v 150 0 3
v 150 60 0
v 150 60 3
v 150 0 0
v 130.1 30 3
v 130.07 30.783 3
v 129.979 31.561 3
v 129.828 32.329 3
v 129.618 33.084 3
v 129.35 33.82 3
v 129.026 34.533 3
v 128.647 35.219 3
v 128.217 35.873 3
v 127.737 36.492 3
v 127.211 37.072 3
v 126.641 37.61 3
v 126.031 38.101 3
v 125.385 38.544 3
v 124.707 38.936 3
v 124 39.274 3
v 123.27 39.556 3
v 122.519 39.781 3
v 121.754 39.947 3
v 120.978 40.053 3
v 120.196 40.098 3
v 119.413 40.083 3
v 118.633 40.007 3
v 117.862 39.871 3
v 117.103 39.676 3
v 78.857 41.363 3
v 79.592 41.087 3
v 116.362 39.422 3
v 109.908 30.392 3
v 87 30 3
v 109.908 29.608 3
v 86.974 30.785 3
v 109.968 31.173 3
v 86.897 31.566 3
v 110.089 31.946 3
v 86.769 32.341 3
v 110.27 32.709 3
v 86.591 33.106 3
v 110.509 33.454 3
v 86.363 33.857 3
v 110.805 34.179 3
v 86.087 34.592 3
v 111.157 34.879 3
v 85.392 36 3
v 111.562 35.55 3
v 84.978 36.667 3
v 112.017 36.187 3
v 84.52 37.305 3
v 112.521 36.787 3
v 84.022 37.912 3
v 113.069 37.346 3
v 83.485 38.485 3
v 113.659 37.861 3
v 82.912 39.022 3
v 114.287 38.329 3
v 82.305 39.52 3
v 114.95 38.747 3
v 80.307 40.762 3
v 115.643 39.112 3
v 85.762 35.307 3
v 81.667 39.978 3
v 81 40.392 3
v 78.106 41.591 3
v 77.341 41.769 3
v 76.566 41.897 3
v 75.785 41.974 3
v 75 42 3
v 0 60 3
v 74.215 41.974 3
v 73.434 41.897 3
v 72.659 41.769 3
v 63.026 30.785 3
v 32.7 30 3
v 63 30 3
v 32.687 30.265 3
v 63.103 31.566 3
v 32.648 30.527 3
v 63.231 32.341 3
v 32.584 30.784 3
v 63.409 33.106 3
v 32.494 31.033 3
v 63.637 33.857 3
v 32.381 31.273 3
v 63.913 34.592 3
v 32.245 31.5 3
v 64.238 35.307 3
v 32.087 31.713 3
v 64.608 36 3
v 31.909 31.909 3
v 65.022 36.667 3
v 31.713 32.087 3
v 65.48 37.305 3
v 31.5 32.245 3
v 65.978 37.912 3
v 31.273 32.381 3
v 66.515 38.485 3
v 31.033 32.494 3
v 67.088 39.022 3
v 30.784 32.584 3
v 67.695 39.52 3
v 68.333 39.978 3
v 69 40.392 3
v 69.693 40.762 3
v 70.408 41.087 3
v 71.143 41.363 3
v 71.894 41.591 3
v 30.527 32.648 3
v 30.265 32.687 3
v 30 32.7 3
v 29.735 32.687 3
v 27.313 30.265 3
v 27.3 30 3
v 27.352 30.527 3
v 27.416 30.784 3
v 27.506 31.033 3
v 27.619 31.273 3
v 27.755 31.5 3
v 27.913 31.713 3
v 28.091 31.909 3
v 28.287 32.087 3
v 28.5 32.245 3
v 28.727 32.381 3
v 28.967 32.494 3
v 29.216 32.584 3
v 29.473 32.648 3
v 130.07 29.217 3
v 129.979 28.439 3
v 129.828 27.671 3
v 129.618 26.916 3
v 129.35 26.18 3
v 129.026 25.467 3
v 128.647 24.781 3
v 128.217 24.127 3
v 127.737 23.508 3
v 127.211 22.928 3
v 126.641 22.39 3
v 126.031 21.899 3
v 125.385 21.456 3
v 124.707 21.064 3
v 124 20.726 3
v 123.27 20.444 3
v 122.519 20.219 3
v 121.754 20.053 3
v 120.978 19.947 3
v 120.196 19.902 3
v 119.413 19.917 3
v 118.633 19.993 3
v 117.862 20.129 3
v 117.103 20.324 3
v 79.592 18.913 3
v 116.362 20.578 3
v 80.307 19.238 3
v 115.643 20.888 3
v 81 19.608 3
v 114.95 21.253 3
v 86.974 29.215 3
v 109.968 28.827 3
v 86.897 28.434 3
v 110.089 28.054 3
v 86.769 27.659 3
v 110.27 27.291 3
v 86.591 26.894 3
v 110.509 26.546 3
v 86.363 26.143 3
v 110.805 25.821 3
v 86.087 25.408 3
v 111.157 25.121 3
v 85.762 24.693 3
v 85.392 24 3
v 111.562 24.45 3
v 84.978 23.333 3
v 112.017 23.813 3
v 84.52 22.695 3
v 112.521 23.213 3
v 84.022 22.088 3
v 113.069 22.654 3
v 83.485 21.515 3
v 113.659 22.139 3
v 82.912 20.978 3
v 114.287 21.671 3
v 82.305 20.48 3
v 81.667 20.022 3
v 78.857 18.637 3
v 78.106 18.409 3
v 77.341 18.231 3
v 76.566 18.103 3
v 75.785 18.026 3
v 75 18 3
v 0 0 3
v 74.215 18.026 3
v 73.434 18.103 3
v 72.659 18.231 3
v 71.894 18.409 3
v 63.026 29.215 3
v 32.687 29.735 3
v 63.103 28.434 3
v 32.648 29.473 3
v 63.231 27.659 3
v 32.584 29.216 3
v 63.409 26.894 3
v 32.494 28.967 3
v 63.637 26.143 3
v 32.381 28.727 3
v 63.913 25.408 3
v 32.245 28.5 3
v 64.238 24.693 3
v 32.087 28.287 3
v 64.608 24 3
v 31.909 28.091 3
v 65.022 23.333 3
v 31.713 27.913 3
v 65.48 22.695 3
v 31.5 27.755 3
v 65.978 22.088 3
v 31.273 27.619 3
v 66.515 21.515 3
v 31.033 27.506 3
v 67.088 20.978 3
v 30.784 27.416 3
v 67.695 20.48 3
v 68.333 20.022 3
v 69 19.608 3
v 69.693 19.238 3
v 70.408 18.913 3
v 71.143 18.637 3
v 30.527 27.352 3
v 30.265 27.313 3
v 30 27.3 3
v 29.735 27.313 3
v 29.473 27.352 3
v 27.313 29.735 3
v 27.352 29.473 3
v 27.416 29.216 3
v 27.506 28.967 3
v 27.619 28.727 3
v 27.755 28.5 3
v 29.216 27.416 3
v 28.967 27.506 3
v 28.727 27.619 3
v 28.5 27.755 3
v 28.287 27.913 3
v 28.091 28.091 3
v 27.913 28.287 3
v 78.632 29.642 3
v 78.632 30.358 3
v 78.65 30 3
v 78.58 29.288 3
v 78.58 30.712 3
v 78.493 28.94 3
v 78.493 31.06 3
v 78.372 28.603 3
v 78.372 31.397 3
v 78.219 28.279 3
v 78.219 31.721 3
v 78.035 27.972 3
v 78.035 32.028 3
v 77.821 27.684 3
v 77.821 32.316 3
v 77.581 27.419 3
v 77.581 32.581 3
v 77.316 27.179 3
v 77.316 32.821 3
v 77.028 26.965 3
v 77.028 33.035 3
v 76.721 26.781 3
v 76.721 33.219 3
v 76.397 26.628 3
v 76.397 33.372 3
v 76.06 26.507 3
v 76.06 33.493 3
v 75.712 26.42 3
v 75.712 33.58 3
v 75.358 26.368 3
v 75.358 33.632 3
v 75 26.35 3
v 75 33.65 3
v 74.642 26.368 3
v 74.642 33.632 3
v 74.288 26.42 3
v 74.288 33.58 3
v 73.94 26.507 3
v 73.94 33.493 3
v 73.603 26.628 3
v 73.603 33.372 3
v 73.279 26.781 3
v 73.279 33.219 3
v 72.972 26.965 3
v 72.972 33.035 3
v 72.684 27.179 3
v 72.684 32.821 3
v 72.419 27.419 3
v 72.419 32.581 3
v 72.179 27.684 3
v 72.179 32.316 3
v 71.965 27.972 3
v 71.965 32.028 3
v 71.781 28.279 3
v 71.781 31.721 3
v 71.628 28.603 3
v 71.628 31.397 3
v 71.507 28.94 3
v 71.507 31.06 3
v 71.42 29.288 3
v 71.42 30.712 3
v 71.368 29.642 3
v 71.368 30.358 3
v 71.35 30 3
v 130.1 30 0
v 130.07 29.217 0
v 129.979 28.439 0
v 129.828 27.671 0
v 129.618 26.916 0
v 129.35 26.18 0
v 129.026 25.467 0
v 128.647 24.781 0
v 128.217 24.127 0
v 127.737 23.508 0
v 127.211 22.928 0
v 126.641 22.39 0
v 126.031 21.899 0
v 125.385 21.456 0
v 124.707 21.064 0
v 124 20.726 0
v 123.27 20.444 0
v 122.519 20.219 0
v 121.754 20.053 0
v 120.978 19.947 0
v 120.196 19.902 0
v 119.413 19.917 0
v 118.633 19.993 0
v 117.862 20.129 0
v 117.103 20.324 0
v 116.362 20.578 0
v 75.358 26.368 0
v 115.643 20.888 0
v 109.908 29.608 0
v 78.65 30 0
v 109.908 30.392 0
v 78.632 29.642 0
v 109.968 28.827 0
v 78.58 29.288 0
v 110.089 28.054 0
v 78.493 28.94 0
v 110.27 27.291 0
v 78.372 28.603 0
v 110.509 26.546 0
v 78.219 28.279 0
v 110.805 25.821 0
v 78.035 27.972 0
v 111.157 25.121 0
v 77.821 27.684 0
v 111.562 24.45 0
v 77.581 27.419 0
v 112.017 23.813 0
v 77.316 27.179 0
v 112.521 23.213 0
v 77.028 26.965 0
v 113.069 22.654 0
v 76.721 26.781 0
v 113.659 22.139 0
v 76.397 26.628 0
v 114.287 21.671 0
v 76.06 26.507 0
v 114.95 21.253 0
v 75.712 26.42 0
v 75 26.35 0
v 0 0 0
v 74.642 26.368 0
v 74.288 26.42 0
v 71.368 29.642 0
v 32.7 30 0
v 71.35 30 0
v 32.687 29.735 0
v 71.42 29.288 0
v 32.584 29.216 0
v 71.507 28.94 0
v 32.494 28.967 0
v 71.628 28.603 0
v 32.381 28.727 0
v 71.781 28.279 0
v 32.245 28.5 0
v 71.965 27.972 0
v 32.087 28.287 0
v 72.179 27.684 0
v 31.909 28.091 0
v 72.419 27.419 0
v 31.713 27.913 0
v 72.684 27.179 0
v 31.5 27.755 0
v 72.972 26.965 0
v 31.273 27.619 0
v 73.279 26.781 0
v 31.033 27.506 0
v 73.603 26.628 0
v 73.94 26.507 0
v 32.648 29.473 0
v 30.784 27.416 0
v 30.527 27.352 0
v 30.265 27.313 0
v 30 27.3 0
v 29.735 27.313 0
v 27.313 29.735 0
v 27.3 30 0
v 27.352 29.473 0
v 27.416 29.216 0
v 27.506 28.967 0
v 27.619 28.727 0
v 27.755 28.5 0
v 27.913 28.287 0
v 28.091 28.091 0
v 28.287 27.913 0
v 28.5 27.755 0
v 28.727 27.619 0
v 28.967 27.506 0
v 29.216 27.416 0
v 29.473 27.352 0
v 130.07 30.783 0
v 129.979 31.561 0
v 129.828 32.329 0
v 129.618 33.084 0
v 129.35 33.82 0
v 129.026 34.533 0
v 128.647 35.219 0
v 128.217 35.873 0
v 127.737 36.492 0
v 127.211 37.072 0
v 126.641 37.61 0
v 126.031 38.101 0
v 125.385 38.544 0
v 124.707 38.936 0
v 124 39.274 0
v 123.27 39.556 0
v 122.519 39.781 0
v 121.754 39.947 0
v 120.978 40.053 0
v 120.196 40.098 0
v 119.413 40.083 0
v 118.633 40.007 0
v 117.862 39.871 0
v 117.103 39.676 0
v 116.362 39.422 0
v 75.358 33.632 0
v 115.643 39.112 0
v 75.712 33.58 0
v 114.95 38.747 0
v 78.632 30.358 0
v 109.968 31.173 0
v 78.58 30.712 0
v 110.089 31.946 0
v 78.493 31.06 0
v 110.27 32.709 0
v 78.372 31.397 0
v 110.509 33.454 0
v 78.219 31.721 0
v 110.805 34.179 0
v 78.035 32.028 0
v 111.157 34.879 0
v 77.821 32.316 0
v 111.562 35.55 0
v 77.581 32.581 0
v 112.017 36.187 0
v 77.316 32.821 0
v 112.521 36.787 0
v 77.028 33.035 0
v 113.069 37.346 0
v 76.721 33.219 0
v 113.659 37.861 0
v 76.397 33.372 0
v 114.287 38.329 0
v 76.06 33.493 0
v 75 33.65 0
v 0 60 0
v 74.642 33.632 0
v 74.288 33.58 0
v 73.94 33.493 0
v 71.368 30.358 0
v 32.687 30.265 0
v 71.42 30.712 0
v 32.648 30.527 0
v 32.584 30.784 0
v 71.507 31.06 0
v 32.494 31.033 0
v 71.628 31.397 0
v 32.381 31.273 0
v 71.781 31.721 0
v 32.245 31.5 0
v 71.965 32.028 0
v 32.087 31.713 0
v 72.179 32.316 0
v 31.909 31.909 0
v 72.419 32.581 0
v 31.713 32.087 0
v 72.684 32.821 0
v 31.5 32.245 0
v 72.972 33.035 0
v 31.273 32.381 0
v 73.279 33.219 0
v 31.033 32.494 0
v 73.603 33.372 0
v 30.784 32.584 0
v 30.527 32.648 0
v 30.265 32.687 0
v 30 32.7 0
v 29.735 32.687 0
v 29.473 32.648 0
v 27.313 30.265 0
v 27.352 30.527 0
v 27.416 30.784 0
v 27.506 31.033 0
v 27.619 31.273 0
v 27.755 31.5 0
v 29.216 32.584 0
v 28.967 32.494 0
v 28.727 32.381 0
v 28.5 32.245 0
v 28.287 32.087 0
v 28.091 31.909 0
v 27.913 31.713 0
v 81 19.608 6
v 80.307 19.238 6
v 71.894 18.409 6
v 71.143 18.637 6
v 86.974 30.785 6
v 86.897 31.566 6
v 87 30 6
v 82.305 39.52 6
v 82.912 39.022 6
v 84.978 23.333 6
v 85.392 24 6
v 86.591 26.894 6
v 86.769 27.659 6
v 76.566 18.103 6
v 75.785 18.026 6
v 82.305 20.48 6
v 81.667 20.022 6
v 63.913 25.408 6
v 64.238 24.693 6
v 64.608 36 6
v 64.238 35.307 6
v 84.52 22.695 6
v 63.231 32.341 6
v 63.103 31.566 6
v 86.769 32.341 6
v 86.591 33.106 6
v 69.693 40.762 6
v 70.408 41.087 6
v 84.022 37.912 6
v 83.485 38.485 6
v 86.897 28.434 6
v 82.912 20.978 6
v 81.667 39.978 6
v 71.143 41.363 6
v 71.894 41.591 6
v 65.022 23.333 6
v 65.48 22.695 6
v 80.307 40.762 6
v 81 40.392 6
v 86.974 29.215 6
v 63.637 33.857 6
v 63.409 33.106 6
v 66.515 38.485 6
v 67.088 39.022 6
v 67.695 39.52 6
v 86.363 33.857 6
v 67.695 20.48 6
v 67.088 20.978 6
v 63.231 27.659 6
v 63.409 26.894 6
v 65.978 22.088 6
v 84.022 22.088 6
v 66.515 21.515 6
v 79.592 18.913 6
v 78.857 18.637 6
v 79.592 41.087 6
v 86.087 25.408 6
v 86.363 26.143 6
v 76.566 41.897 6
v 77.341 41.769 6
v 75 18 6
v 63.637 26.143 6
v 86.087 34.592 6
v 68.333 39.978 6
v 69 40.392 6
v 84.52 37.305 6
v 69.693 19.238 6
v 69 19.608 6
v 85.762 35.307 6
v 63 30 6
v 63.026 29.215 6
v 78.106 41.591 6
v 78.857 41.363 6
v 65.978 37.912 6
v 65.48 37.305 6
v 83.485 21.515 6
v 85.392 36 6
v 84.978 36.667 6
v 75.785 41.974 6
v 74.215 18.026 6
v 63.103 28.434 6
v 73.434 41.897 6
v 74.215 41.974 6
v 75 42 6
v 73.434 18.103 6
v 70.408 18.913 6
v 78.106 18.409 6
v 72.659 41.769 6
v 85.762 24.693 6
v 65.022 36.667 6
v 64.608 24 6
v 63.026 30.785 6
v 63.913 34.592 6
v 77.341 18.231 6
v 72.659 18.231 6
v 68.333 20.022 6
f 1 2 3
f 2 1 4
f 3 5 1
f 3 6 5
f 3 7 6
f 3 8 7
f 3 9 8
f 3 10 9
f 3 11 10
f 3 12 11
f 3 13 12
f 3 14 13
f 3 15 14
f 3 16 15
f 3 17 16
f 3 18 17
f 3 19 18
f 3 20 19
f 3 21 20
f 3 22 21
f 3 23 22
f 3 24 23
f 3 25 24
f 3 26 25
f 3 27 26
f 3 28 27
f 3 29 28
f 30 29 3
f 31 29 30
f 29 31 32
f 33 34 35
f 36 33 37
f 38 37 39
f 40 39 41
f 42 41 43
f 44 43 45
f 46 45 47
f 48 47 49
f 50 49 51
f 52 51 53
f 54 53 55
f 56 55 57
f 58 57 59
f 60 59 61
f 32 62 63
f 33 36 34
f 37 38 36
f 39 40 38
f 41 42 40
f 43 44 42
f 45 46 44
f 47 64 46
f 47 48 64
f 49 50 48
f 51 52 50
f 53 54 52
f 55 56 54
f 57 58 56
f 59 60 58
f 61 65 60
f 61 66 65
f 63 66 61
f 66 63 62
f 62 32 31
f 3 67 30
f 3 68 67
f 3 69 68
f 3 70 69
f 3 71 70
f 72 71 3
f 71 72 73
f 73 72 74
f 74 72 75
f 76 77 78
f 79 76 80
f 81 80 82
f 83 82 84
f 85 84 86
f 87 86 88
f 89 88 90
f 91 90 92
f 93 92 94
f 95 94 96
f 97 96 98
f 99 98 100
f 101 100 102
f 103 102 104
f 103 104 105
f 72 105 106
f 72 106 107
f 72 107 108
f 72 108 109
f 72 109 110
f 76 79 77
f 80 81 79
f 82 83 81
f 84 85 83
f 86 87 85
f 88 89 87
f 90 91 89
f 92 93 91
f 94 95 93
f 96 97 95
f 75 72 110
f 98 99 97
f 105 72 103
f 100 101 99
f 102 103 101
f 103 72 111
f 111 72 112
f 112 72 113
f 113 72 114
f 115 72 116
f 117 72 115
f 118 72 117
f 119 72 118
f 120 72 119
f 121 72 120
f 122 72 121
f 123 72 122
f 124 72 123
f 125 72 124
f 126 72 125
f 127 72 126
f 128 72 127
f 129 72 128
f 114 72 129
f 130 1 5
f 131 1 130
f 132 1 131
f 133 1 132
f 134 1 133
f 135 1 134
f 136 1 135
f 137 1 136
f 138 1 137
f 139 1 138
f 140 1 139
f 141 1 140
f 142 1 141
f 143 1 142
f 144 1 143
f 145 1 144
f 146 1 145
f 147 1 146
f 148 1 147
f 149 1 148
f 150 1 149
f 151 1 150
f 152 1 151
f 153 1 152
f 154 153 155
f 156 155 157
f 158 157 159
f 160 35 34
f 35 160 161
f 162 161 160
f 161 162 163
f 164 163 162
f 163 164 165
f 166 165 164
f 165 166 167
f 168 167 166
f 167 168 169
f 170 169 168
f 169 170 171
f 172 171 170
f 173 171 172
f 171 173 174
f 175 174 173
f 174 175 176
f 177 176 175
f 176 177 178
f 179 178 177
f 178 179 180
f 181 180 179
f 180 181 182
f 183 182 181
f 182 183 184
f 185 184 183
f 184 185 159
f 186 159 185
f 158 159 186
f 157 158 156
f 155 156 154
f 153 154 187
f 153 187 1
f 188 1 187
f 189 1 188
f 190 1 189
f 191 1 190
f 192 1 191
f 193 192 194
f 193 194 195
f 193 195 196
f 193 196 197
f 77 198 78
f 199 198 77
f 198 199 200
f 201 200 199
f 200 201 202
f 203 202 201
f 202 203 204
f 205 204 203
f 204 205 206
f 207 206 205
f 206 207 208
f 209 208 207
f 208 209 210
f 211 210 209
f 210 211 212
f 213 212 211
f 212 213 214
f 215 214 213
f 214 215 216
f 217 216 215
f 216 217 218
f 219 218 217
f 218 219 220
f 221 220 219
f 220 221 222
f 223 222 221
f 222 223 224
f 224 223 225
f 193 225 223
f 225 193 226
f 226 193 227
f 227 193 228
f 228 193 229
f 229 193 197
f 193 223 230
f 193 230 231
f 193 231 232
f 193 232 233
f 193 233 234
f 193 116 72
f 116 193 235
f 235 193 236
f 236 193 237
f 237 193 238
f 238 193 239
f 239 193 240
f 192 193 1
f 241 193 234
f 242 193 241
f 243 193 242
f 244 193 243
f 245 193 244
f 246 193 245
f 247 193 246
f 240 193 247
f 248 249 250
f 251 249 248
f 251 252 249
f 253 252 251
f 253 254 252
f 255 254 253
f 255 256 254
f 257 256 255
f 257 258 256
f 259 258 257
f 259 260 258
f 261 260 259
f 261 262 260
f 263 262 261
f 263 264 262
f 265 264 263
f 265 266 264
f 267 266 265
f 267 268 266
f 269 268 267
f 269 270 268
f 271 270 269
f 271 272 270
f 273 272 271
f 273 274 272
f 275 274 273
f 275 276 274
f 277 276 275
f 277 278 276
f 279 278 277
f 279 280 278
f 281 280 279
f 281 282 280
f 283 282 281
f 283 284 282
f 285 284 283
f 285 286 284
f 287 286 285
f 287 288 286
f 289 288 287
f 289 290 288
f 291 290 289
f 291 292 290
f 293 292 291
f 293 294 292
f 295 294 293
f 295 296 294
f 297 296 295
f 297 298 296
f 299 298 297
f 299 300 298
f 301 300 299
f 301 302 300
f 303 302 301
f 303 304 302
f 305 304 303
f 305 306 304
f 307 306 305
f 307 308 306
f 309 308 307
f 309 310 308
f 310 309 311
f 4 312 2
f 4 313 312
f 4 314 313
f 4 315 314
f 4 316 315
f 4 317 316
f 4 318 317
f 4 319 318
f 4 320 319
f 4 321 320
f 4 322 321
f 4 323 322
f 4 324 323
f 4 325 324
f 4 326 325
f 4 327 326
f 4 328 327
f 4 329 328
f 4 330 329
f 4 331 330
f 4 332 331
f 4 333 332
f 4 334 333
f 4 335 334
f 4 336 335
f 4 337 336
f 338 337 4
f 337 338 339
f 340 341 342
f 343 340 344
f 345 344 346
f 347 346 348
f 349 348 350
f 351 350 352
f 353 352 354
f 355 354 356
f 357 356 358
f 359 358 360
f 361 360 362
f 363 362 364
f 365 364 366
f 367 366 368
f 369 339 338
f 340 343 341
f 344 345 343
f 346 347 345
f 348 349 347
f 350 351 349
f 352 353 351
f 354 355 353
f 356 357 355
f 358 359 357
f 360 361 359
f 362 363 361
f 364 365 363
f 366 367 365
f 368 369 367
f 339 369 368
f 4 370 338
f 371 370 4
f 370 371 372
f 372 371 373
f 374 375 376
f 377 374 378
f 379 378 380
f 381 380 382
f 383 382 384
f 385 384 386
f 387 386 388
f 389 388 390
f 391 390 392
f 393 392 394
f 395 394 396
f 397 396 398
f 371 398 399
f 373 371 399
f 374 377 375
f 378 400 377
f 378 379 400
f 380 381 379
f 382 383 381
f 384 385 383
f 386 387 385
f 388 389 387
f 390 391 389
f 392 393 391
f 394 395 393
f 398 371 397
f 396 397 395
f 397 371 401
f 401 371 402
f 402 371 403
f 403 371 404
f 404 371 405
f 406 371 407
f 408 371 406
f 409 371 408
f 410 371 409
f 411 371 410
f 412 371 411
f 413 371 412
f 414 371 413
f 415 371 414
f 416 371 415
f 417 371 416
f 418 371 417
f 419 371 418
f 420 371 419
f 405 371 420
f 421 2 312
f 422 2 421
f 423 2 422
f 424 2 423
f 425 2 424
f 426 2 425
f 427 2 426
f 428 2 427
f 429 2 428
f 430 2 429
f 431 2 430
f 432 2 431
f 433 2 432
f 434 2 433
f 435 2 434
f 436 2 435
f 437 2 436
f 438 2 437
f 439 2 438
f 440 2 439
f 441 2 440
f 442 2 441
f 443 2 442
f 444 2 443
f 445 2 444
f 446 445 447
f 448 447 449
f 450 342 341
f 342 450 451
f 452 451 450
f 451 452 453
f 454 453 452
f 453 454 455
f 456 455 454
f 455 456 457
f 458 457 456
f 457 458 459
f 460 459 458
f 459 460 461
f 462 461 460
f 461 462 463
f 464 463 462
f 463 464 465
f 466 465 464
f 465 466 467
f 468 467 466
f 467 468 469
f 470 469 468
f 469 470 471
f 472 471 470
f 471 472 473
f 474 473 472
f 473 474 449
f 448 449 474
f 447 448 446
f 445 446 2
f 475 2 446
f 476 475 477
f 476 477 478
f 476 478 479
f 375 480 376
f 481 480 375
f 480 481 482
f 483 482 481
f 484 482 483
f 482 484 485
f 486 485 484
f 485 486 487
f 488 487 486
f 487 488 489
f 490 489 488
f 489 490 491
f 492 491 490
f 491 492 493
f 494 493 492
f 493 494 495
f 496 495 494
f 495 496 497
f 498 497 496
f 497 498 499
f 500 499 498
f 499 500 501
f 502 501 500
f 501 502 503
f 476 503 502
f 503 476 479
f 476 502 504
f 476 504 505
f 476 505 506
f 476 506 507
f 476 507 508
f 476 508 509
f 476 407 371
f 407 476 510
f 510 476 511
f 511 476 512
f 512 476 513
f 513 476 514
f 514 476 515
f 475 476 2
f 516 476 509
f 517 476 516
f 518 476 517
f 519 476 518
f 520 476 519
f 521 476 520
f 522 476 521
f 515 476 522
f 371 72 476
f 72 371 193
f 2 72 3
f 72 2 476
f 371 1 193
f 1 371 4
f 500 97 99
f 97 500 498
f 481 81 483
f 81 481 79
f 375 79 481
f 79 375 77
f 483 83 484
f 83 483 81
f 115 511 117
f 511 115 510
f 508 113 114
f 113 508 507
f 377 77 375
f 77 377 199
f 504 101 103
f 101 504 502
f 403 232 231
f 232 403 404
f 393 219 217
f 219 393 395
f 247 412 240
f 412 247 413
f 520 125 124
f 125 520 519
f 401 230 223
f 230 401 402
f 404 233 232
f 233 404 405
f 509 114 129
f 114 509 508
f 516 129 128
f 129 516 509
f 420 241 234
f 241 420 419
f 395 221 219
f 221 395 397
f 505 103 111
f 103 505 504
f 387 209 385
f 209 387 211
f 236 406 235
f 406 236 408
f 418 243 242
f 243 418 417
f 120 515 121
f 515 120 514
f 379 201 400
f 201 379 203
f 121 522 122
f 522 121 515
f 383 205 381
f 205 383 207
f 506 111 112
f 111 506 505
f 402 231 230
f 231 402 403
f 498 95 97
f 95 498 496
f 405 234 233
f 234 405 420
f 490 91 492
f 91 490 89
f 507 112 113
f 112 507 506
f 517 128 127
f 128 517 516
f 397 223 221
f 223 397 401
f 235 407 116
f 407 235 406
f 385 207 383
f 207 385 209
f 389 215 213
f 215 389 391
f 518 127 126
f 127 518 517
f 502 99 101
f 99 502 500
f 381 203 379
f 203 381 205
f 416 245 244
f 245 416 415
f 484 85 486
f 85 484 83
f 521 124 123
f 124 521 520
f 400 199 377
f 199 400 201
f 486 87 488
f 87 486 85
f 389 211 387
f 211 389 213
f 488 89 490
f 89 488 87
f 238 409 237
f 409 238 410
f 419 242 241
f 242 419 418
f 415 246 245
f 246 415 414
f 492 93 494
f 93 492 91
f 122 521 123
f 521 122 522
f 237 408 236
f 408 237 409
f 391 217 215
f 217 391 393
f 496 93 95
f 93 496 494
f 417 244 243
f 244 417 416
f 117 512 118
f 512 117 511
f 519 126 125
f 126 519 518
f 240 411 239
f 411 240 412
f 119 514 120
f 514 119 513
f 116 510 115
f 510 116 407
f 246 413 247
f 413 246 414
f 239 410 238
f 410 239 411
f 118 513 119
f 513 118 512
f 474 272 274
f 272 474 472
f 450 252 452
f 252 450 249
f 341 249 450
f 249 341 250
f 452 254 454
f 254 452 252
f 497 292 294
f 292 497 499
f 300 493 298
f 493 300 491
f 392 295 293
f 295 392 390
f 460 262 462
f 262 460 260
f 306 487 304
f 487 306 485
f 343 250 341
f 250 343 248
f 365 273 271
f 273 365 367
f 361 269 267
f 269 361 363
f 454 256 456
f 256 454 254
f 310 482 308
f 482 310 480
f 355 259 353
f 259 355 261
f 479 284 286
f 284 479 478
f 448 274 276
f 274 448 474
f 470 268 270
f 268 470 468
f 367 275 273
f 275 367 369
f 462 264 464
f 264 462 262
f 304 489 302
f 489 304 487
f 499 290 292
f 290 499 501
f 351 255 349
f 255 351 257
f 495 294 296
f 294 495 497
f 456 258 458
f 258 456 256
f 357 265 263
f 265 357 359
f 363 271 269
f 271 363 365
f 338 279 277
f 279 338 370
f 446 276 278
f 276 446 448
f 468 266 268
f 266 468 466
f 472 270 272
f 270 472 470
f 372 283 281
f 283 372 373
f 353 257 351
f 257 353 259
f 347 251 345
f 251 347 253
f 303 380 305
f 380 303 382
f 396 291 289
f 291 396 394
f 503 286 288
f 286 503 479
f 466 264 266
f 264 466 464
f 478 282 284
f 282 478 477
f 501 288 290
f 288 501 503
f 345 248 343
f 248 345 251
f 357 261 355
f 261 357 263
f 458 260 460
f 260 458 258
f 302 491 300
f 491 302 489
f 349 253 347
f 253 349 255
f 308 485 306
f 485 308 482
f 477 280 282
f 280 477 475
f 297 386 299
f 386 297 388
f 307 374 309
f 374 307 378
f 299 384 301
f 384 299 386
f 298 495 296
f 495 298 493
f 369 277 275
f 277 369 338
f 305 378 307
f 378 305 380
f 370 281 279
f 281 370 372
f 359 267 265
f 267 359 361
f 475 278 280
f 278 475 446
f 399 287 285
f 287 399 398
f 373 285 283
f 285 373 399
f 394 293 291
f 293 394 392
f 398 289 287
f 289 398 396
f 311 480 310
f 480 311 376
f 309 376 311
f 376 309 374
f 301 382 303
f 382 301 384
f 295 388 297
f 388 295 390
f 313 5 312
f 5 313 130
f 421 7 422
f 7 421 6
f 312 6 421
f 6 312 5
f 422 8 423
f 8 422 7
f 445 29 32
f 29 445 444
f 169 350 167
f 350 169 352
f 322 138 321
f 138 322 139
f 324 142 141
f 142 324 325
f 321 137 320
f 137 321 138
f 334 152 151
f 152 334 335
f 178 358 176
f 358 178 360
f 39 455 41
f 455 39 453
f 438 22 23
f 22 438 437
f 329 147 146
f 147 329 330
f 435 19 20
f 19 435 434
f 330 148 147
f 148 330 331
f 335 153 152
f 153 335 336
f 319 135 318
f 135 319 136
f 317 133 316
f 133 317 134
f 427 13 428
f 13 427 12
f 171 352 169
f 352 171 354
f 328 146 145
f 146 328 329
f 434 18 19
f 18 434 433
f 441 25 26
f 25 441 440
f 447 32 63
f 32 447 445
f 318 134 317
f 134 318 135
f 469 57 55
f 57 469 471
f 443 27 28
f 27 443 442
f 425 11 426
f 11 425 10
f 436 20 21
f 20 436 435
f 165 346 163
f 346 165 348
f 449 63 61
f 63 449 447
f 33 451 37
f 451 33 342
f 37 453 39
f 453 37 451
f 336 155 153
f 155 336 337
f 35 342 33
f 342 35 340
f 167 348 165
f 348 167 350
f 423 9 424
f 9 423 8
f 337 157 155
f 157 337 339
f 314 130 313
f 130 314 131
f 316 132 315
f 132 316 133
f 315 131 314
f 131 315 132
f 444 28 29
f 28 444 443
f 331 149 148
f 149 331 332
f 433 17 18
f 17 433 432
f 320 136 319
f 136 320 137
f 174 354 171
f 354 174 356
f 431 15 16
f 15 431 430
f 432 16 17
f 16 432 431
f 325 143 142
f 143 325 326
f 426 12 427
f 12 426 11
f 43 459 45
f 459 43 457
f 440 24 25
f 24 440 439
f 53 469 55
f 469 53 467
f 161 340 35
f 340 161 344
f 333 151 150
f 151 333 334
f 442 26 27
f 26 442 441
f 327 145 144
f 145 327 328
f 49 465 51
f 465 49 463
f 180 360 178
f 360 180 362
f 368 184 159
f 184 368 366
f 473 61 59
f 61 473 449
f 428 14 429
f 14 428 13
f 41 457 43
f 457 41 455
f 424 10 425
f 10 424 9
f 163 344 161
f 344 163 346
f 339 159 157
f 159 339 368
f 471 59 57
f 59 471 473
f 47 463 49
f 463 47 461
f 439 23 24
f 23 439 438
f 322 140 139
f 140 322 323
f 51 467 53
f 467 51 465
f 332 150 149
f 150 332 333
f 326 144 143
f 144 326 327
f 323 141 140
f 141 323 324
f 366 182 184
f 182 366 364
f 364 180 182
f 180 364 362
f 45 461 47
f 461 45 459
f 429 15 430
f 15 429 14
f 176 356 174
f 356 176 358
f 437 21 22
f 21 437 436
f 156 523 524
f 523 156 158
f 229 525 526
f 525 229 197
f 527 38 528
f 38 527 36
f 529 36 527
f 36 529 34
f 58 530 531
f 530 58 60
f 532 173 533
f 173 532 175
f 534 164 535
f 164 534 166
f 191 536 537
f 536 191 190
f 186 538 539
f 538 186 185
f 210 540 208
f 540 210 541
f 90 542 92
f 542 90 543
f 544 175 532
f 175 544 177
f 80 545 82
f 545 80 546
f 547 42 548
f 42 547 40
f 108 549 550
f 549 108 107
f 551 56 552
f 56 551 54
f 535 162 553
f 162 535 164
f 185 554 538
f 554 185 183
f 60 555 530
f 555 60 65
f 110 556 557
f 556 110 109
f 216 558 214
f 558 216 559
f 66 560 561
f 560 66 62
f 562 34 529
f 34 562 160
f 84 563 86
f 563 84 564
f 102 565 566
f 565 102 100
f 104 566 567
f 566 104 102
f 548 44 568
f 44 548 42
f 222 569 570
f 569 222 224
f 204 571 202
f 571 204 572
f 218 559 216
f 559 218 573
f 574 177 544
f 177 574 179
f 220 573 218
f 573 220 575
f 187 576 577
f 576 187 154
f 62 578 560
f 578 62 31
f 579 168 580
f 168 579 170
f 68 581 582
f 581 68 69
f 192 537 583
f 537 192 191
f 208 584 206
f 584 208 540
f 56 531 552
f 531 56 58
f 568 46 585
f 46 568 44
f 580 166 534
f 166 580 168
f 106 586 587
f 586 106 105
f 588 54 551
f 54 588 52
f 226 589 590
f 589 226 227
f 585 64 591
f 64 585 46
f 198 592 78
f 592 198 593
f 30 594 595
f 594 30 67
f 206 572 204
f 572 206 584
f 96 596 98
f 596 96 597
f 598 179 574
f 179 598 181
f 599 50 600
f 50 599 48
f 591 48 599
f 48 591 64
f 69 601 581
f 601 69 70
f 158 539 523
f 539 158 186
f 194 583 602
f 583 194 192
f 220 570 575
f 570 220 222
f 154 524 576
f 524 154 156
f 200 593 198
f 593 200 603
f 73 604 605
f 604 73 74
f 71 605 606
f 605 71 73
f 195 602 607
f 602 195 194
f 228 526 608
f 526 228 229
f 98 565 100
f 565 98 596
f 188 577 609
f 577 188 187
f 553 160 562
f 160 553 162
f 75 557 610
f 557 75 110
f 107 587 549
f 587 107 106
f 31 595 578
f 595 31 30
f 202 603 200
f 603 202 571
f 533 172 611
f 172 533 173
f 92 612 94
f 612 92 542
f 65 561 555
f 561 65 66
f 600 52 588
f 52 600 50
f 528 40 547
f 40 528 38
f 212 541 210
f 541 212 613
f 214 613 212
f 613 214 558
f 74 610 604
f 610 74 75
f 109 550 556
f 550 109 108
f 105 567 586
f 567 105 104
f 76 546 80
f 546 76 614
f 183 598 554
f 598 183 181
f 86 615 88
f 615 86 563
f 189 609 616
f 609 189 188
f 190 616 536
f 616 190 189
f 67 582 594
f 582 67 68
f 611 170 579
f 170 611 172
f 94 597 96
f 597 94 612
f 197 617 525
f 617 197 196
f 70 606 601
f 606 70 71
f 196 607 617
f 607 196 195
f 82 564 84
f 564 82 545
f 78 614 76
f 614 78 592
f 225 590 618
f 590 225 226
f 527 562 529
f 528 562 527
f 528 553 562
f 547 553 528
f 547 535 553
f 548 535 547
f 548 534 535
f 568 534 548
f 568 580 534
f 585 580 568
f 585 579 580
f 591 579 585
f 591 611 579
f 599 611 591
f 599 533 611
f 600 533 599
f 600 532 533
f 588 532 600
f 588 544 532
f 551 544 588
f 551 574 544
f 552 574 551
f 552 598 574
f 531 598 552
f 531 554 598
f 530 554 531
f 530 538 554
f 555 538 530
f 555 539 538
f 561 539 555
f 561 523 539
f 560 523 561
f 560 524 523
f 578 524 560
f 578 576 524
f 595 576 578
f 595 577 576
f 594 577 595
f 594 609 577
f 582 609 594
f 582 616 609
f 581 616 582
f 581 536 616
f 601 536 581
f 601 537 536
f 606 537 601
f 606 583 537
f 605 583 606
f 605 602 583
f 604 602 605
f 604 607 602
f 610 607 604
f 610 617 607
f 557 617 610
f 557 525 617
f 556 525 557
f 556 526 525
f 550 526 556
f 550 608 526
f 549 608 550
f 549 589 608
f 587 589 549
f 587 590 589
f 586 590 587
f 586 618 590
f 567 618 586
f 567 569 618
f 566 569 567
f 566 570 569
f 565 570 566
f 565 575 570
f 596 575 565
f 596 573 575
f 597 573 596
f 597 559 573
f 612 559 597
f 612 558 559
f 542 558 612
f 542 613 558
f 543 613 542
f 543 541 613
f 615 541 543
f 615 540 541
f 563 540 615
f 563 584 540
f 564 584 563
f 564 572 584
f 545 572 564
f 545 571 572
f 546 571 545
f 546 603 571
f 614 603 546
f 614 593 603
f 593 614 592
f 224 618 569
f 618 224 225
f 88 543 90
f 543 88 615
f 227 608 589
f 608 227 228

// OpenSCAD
module ControlPlate(){
  difference(){
    translate([0, 0, 0])cube([150, 60, 3.0]);
    translate([0, 0, -0.1])translate([30, 30, 0])cylinder(d=5.4,h=3.2,$fn=64);
    translate([0, 0, -0.1])translate([75, 30, 0])cylinder(d=7.3,h=3.2,$fn=64);
    translate([0, 0, -0.1])translate([120, 30, 0])cylinder(d=20.2,h=3.2,$fn=81);
  }
}
$fn=64;
union(){
  color("black")ControlPlate();
  translate([75, 30, 3])color("silver")cylinder(d=24,h=3,$fn=96);
}
